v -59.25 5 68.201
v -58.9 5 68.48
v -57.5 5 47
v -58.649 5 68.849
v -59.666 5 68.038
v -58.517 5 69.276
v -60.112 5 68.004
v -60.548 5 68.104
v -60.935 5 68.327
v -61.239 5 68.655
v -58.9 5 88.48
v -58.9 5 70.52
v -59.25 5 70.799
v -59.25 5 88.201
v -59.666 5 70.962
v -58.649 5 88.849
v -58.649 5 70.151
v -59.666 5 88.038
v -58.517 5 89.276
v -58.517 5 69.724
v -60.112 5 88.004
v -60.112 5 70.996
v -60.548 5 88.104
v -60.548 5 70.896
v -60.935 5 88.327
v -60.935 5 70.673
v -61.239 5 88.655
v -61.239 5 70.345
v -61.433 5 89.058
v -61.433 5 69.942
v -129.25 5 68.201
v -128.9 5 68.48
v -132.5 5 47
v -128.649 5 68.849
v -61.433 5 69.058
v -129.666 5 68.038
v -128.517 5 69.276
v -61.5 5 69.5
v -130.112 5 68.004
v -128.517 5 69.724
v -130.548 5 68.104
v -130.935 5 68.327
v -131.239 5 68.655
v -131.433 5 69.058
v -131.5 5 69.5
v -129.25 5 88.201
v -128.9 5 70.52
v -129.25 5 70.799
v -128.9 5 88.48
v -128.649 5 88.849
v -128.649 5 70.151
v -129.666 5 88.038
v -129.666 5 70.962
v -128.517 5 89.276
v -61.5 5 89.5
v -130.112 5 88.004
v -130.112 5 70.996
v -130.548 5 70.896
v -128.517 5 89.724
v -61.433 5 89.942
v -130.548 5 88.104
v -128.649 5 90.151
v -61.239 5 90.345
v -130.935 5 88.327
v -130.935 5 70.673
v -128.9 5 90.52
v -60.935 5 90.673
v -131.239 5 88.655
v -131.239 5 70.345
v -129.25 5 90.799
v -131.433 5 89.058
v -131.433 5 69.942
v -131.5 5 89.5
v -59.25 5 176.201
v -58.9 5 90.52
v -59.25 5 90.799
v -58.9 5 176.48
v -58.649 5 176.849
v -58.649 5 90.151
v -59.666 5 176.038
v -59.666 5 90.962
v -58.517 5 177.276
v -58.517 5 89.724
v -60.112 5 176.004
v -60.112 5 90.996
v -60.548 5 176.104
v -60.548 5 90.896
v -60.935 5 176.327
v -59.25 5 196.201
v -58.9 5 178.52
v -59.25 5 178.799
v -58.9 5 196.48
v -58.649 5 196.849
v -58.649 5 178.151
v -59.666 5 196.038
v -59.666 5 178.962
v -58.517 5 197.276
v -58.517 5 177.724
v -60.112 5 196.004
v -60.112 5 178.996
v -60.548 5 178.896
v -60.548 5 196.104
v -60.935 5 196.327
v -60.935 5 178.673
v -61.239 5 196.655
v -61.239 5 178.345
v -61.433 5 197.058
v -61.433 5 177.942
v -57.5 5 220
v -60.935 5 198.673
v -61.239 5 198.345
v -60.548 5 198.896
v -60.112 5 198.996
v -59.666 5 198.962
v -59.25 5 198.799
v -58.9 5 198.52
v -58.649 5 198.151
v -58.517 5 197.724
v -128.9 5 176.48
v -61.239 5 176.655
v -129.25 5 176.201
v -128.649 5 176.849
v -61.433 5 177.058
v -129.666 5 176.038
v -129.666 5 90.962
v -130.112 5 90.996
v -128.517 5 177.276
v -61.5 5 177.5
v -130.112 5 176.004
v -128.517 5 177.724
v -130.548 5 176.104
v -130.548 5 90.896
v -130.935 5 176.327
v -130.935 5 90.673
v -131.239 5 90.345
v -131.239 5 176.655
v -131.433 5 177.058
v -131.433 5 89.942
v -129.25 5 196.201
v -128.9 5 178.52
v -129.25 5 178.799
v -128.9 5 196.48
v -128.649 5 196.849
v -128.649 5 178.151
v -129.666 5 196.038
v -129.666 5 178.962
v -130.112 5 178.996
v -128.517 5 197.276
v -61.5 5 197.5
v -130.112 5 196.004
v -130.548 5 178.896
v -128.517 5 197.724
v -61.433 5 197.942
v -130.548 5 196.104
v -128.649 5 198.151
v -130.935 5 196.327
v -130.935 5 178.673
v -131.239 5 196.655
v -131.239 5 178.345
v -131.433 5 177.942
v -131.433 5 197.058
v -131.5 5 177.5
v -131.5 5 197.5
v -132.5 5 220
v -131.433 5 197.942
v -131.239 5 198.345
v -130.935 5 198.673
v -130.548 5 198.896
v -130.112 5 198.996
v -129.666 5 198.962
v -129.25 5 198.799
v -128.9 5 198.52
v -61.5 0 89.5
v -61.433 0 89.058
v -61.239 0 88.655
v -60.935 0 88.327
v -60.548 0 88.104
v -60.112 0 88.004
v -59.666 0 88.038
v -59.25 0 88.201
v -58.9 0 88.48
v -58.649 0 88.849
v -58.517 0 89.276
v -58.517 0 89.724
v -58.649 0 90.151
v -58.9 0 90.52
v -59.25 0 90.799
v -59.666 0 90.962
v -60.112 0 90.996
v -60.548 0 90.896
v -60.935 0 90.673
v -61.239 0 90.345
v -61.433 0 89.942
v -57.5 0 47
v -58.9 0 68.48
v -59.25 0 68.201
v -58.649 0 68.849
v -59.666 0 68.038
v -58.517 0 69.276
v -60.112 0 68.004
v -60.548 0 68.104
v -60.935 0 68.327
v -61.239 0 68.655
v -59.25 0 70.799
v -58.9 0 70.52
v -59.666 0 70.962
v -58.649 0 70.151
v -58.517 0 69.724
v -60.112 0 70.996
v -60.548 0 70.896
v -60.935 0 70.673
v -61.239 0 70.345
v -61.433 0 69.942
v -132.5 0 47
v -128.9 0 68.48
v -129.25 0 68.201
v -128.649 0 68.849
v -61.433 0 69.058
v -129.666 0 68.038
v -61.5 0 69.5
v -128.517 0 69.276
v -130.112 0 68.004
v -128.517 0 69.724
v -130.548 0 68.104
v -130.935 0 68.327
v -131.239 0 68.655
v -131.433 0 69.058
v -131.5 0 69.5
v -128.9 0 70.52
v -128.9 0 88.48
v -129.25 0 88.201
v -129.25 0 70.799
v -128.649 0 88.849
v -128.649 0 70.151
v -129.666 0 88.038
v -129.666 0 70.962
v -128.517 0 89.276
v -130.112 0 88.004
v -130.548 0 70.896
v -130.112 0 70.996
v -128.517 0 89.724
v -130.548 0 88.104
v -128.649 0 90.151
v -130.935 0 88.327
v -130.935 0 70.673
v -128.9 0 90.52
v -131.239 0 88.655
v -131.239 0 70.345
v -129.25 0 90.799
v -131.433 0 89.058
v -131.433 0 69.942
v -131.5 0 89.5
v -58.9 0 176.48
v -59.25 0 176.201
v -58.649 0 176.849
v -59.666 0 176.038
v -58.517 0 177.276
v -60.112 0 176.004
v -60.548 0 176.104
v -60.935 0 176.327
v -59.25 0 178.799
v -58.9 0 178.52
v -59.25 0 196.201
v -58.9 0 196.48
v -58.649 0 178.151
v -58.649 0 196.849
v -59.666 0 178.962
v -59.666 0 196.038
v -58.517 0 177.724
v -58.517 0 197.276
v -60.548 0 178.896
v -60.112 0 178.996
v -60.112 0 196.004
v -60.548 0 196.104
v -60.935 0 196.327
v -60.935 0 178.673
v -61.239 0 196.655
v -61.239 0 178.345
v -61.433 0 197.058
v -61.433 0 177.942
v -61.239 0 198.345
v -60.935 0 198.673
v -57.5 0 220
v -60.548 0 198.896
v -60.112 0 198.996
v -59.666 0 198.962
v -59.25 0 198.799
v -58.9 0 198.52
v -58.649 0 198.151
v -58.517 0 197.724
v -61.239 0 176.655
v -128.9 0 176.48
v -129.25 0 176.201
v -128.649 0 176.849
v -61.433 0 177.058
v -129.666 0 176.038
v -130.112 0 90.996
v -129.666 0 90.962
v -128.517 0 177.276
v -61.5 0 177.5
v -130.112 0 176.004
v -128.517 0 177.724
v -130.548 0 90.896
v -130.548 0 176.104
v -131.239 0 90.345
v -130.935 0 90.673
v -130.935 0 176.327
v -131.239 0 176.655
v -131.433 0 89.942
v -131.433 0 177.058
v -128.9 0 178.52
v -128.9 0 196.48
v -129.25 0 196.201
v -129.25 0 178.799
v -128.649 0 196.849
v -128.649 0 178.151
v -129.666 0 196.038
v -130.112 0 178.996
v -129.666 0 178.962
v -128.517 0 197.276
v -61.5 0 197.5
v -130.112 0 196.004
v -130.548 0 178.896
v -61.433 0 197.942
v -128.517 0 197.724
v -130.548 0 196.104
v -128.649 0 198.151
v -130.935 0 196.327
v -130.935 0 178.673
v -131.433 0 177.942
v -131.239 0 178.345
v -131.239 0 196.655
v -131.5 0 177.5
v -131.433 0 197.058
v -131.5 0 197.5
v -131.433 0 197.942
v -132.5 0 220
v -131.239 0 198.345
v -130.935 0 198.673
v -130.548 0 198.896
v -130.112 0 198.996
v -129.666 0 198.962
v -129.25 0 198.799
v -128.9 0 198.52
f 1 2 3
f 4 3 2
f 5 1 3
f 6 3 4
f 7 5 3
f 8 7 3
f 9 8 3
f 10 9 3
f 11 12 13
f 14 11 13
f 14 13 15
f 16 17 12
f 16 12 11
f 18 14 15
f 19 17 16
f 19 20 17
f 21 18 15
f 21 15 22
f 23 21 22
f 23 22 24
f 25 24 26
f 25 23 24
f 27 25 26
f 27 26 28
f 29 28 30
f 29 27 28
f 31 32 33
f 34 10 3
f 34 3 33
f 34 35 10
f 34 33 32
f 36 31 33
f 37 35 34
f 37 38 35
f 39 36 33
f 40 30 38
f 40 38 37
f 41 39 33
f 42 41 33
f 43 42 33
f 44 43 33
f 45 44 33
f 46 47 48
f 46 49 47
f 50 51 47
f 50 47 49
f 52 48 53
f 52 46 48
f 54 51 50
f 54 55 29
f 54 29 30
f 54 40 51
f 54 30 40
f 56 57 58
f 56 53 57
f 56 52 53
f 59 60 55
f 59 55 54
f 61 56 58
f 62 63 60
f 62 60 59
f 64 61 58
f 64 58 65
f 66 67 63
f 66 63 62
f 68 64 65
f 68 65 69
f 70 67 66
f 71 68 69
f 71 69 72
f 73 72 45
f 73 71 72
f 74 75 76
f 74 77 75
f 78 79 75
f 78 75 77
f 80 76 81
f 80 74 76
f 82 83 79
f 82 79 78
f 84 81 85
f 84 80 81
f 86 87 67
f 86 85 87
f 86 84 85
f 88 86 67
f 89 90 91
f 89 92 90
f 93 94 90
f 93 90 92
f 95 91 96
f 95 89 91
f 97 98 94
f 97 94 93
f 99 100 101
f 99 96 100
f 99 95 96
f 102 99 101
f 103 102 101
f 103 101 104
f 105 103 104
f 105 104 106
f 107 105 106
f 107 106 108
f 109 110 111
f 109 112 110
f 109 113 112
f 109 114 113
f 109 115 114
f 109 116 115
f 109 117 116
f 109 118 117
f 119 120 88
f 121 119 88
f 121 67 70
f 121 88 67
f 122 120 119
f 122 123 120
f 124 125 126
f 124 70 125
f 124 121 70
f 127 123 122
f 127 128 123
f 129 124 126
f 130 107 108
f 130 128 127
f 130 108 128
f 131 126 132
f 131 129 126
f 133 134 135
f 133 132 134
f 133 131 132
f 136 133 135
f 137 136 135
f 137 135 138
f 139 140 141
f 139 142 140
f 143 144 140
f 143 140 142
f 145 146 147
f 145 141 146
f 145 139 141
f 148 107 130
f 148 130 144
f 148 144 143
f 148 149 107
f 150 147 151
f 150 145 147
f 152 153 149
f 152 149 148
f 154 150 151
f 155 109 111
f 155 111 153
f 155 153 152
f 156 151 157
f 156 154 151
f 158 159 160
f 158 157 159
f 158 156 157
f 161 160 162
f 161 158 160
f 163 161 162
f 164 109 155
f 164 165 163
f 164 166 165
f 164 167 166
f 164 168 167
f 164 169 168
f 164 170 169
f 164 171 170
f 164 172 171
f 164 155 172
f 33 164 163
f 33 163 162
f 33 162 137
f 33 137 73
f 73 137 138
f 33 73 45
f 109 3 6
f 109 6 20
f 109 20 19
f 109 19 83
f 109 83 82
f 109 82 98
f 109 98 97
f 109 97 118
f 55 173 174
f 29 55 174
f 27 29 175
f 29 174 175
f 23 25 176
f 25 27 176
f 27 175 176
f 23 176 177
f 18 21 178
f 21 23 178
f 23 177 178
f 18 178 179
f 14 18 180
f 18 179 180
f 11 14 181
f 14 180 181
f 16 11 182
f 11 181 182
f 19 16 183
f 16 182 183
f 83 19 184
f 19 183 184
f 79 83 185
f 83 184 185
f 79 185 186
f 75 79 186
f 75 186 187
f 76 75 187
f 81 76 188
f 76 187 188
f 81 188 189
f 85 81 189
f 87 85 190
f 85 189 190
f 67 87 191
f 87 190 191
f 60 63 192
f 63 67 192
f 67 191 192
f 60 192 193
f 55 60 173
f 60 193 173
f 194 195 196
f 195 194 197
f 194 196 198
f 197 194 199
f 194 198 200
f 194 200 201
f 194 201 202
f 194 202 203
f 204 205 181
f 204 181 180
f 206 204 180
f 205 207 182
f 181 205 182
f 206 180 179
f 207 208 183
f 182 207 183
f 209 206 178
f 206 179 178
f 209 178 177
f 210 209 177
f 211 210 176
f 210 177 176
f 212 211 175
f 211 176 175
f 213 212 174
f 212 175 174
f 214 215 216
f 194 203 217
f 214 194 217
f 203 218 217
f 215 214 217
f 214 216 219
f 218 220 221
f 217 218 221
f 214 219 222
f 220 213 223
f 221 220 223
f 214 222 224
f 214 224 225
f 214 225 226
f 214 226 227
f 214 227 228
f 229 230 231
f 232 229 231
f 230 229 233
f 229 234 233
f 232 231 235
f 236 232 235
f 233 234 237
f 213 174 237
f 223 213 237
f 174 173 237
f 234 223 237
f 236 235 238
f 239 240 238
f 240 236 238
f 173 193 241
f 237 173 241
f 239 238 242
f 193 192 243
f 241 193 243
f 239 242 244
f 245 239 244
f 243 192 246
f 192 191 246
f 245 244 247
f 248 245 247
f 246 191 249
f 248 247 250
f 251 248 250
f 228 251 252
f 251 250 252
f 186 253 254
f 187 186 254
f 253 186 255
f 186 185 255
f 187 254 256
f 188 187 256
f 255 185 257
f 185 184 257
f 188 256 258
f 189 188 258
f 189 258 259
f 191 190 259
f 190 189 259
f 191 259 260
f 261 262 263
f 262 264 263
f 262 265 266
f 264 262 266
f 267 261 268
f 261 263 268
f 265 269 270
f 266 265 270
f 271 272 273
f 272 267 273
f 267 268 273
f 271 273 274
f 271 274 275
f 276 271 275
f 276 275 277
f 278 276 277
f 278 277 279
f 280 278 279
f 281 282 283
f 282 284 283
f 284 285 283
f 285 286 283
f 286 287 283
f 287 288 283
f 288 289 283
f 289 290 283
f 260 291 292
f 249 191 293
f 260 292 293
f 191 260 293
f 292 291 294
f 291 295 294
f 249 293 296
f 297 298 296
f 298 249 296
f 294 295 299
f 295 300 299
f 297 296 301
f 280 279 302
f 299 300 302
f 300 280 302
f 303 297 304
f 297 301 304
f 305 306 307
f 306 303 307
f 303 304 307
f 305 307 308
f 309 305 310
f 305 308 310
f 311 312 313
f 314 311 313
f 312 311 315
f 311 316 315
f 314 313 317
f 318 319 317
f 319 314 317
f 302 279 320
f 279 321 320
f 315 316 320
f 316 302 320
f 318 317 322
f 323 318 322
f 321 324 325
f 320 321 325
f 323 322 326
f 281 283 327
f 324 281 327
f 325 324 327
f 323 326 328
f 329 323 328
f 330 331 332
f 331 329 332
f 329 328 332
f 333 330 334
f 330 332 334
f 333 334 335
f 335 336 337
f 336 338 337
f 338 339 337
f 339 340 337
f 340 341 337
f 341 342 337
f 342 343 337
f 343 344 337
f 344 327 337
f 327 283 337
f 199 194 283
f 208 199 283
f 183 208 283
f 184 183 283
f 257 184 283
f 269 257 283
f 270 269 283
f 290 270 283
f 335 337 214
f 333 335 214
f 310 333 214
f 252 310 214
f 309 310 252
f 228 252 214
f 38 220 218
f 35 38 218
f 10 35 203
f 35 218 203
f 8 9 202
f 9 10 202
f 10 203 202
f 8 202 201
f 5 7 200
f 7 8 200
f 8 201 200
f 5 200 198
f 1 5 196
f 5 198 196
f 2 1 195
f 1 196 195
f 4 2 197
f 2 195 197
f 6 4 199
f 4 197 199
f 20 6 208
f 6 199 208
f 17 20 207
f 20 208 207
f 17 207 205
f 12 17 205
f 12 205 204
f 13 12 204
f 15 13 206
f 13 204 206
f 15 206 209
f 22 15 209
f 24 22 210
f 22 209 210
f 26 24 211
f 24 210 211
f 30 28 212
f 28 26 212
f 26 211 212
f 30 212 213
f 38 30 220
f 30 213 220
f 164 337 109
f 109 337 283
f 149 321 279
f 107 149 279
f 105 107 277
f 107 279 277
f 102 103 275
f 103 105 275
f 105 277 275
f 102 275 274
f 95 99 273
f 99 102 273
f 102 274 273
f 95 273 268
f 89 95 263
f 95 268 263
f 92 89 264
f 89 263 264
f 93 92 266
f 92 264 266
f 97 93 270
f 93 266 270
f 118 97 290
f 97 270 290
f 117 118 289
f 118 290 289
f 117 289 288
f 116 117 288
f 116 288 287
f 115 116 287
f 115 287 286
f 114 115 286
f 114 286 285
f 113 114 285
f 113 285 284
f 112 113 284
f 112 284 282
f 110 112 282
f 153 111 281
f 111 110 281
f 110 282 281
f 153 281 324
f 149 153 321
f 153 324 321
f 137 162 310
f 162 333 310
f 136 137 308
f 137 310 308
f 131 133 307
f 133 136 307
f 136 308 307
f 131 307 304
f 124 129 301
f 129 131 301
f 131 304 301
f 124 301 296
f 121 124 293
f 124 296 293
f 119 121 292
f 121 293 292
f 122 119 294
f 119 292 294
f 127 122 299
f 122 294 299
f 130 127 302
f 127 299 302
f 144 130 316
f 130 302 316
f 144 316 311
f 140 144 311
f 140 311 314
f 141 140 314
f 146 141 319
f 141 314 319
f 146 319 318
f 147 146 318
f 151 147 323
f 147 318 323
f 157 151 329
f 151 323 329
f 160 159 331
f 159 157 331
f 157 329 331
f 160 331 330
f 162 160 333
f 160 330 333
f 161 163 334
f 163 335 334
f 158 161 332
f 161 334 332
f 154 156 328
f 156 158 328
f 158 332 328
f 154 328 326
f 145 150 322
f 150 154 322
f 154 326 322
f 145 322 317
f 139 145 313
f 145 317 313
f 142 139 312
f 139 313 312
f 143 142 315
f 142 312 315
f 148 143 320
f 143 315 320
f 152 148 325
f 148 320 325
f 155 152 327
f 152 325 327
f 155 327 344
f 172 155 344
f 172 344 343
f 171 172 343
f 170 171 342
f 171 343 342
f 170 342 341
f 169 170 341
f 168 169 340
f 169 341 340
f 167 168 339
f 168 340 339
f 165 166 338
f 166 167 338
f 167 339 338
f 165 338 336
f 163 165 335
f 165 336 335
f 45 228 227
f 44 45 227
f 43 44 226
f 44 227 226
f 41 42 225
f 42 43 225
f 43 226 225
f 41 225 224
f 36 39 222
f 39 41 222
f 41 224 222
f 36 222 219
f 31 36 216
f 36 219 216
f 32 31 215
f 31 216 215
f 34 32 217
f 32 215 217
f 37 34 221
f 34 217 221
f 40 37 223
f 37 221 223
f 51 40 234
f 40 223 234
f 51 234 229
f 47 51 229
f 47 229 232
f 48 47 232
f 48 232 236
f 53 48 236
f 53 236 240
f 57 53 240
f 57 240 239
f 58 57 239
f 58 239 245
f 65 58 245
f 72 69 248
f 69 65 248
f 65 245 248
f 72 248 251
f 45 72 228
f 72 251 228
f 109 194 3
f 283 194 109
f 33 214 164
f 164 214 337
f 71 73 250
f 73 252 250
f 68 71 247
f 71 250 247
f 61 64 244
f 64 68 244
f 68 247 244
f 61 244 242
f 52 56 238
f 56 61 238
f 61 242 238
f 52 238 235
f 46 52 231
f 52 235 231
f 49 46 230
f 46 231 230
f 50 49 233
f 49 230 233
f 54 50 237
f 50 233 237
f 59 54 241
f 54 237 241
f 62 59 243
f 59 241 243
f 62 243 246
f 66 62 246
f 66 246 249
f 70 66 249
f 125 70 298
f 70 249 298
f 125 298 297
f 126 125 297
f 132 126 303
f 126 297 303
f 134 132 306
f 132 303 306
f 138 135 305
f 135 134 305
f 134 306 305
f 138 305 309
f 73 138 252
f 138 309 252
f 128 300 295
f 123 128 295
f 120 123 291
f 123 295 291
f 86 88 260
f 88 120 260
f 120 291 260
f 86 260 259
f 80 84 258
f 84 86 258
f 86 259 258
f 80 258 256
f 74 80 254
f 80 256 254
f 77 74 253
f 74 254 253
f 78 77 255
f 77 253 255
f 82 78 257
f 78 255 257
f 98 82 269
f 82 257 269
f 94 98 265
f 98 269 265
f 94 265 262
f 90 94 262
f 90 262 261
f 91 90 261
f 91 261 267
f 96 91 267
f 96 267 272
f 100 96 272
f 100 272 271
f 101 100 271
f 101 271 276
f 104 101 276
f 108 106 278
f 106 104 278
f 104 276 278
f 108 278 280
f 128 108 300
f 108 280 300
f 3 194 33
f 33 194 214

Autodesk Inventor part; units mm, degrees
ref_plane "YZ Plane" through (0, 0, 0) normal (1, 0, 0) x (0, 1, 0)
ref_plane "XZ Plane" through (0, 0, 0) normal (0, 1, 0) x (-1, 0, 0)
ref_plane "XY Plane" through (0, 0, 0) normal (0, 0, 1) x (1, 0, 0)
sketch "Эскиз1" plane through (0, 0, 0) normal (0, 1, 0) x (-1, 0, 0)
  line L0 (57.5, 47) -> (132.5, 47)
  line L1 (132.5, 47) -> (132.5, 220)
  line L2 (132.5, 220) -> (57.5, 220)
  line L3 (57.5, 47) -> (57.5, 220)
  circle A0 centre (130, 197.5) radius 1.5
  circle A1 centre (130, 177.5) radius 1.5
  circle A2 centre (130, 69.5) radius 1.5
  circle A3 centre (130, 89.5) radius 1.5
  circle A4 centre (60, 197.5) radius 1.5
  circle A5 centre (60, 177.5) radius 1.5
  circle A6 centre (60, 69.5) radius 1.5
  circle A7 centre (60, 89.5) radius 1.5
  point P0 (0, 0)
  dimension "d10" = 3
  dimension "d11" = 3
extrude "Выдавливание1" add sketch "Эскиз1" along normal blind 5
properties part number "Крышка на отсек с батареей"
